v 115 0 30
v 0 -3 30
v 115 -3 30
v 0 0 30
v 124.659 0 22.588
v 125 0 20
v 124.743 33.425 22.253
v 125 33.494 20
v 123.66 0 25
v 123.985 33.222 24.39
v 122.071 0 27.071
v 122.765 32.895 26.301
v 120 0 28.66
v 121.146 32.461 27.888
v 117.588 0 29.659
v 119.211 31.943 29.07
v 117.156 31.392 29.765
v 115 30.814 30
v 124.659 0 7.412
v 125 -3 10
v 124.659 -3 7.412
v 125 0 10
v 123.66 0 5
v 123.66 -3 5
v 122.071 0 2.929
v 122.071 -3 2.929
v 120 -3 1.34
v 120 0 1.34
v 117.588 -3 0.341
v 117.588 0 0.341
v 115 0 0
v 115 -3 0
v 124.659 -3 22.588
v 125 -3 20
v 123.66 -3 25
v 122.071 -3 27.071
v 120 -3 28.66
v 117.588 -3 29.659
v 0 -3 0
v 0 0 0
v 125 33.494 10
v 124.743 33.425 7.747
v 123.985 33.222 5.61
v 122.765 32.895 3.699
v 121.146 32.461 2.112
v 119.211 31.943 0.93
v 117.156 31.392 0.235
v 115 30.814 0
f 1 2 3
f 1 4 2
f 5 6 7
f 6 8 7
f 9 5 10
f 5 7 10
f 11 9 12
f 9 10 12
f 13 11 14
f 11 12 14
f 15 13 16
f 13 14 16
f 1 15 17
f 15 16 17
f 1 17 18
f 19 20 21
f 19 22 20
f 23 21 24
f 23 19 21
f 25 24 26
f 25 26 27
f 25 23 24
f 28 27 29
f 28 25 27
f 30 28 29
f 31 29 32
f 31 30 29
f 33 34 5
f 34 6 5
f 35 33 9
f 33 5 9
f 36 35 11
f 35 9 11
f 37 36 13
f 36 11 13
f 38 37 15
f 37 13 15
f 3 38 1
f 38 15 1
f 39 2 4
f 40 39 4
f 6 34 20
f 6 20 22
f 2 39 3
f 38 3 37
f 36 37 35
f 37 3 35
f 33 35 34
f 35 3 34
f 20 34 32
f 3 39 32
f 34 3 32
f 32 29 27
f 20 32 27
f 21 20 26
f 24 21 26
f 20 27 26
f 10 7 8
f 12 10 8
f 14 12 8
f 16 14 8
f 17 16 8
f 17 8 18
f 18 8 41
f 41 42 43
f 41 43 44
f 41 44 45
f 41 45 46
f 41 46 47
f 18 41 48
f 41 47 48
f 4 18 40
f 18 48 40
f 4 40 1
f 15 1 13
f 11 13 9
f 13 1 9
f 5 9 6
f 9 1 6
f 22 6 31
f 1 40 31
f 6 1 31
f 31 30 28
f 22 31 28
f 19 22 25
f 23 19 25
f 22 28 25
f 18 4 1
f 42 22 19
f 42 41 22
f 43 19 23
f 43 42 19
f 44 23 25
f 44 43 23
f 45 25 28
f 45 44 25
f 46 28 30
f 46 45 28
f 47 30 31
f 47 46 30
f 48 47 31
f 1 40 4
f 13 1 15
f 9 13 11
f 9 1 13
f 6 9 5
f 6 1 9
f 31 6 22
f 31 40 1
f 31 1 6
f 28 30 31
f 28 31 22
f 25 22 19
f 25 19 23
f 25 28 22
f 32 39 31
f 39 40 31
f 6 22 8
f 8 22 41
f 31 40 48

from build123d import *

# Parameters (mm, degrees)
F1_DEPTH = 30
F0_W     = 125
F0_H     = 3
F2_DEPTH = 30
F3_R     = 10
F3_2_R   = 10
F4_R     = 10
F5_R     = 10


with BuildPart() as f1:
    # F0 (on Top) → F1 (new body)
    with BuildSketch(Plane.XY):
        Polygon((125, 33.493649), (0, 0), (125, 0), align=None)
    extrude(amount=F1_DEPTH)

    # F3
    f3_edges = [f1.edges().sort_by_distance(p)[0] for p in [
        (125, 16.746825, 30),
    ]]
    fillet(f3_edges, radius=F3_R)

    # F4
    f4_edges = [f1.edges().sort_by_distance(p)[0] for p in [
        (125, 16.746825, 0),
    ]]
    fillet(f4_edges, radius=F4_R)


with BuildPart() as f2:
    # F0 (on Top) → F2 (new body)
    with BuildSketch(Plane.XY):
        with Locations((62.5, -1.5)):
            Rectangle(F0_W, F0_H)
    extrude(amount=F2_DEPTH)

    # F3#2
    f3_2_edges = [f2.edges().sort_by_distance(p)[0] for p in [
        (125, -1.5, 30),
    ]]
    fillet(f3_2_edges, radius=F3_2_R)

    # F5
    f5_edges = [f2.edges().sort_by_distance(p)[0] for p in [
        (125, -1.5, 0),
    ]]
    fillet(f5_edges, radius=F5_R)


solid = Compound([f1.part, f2.part])
